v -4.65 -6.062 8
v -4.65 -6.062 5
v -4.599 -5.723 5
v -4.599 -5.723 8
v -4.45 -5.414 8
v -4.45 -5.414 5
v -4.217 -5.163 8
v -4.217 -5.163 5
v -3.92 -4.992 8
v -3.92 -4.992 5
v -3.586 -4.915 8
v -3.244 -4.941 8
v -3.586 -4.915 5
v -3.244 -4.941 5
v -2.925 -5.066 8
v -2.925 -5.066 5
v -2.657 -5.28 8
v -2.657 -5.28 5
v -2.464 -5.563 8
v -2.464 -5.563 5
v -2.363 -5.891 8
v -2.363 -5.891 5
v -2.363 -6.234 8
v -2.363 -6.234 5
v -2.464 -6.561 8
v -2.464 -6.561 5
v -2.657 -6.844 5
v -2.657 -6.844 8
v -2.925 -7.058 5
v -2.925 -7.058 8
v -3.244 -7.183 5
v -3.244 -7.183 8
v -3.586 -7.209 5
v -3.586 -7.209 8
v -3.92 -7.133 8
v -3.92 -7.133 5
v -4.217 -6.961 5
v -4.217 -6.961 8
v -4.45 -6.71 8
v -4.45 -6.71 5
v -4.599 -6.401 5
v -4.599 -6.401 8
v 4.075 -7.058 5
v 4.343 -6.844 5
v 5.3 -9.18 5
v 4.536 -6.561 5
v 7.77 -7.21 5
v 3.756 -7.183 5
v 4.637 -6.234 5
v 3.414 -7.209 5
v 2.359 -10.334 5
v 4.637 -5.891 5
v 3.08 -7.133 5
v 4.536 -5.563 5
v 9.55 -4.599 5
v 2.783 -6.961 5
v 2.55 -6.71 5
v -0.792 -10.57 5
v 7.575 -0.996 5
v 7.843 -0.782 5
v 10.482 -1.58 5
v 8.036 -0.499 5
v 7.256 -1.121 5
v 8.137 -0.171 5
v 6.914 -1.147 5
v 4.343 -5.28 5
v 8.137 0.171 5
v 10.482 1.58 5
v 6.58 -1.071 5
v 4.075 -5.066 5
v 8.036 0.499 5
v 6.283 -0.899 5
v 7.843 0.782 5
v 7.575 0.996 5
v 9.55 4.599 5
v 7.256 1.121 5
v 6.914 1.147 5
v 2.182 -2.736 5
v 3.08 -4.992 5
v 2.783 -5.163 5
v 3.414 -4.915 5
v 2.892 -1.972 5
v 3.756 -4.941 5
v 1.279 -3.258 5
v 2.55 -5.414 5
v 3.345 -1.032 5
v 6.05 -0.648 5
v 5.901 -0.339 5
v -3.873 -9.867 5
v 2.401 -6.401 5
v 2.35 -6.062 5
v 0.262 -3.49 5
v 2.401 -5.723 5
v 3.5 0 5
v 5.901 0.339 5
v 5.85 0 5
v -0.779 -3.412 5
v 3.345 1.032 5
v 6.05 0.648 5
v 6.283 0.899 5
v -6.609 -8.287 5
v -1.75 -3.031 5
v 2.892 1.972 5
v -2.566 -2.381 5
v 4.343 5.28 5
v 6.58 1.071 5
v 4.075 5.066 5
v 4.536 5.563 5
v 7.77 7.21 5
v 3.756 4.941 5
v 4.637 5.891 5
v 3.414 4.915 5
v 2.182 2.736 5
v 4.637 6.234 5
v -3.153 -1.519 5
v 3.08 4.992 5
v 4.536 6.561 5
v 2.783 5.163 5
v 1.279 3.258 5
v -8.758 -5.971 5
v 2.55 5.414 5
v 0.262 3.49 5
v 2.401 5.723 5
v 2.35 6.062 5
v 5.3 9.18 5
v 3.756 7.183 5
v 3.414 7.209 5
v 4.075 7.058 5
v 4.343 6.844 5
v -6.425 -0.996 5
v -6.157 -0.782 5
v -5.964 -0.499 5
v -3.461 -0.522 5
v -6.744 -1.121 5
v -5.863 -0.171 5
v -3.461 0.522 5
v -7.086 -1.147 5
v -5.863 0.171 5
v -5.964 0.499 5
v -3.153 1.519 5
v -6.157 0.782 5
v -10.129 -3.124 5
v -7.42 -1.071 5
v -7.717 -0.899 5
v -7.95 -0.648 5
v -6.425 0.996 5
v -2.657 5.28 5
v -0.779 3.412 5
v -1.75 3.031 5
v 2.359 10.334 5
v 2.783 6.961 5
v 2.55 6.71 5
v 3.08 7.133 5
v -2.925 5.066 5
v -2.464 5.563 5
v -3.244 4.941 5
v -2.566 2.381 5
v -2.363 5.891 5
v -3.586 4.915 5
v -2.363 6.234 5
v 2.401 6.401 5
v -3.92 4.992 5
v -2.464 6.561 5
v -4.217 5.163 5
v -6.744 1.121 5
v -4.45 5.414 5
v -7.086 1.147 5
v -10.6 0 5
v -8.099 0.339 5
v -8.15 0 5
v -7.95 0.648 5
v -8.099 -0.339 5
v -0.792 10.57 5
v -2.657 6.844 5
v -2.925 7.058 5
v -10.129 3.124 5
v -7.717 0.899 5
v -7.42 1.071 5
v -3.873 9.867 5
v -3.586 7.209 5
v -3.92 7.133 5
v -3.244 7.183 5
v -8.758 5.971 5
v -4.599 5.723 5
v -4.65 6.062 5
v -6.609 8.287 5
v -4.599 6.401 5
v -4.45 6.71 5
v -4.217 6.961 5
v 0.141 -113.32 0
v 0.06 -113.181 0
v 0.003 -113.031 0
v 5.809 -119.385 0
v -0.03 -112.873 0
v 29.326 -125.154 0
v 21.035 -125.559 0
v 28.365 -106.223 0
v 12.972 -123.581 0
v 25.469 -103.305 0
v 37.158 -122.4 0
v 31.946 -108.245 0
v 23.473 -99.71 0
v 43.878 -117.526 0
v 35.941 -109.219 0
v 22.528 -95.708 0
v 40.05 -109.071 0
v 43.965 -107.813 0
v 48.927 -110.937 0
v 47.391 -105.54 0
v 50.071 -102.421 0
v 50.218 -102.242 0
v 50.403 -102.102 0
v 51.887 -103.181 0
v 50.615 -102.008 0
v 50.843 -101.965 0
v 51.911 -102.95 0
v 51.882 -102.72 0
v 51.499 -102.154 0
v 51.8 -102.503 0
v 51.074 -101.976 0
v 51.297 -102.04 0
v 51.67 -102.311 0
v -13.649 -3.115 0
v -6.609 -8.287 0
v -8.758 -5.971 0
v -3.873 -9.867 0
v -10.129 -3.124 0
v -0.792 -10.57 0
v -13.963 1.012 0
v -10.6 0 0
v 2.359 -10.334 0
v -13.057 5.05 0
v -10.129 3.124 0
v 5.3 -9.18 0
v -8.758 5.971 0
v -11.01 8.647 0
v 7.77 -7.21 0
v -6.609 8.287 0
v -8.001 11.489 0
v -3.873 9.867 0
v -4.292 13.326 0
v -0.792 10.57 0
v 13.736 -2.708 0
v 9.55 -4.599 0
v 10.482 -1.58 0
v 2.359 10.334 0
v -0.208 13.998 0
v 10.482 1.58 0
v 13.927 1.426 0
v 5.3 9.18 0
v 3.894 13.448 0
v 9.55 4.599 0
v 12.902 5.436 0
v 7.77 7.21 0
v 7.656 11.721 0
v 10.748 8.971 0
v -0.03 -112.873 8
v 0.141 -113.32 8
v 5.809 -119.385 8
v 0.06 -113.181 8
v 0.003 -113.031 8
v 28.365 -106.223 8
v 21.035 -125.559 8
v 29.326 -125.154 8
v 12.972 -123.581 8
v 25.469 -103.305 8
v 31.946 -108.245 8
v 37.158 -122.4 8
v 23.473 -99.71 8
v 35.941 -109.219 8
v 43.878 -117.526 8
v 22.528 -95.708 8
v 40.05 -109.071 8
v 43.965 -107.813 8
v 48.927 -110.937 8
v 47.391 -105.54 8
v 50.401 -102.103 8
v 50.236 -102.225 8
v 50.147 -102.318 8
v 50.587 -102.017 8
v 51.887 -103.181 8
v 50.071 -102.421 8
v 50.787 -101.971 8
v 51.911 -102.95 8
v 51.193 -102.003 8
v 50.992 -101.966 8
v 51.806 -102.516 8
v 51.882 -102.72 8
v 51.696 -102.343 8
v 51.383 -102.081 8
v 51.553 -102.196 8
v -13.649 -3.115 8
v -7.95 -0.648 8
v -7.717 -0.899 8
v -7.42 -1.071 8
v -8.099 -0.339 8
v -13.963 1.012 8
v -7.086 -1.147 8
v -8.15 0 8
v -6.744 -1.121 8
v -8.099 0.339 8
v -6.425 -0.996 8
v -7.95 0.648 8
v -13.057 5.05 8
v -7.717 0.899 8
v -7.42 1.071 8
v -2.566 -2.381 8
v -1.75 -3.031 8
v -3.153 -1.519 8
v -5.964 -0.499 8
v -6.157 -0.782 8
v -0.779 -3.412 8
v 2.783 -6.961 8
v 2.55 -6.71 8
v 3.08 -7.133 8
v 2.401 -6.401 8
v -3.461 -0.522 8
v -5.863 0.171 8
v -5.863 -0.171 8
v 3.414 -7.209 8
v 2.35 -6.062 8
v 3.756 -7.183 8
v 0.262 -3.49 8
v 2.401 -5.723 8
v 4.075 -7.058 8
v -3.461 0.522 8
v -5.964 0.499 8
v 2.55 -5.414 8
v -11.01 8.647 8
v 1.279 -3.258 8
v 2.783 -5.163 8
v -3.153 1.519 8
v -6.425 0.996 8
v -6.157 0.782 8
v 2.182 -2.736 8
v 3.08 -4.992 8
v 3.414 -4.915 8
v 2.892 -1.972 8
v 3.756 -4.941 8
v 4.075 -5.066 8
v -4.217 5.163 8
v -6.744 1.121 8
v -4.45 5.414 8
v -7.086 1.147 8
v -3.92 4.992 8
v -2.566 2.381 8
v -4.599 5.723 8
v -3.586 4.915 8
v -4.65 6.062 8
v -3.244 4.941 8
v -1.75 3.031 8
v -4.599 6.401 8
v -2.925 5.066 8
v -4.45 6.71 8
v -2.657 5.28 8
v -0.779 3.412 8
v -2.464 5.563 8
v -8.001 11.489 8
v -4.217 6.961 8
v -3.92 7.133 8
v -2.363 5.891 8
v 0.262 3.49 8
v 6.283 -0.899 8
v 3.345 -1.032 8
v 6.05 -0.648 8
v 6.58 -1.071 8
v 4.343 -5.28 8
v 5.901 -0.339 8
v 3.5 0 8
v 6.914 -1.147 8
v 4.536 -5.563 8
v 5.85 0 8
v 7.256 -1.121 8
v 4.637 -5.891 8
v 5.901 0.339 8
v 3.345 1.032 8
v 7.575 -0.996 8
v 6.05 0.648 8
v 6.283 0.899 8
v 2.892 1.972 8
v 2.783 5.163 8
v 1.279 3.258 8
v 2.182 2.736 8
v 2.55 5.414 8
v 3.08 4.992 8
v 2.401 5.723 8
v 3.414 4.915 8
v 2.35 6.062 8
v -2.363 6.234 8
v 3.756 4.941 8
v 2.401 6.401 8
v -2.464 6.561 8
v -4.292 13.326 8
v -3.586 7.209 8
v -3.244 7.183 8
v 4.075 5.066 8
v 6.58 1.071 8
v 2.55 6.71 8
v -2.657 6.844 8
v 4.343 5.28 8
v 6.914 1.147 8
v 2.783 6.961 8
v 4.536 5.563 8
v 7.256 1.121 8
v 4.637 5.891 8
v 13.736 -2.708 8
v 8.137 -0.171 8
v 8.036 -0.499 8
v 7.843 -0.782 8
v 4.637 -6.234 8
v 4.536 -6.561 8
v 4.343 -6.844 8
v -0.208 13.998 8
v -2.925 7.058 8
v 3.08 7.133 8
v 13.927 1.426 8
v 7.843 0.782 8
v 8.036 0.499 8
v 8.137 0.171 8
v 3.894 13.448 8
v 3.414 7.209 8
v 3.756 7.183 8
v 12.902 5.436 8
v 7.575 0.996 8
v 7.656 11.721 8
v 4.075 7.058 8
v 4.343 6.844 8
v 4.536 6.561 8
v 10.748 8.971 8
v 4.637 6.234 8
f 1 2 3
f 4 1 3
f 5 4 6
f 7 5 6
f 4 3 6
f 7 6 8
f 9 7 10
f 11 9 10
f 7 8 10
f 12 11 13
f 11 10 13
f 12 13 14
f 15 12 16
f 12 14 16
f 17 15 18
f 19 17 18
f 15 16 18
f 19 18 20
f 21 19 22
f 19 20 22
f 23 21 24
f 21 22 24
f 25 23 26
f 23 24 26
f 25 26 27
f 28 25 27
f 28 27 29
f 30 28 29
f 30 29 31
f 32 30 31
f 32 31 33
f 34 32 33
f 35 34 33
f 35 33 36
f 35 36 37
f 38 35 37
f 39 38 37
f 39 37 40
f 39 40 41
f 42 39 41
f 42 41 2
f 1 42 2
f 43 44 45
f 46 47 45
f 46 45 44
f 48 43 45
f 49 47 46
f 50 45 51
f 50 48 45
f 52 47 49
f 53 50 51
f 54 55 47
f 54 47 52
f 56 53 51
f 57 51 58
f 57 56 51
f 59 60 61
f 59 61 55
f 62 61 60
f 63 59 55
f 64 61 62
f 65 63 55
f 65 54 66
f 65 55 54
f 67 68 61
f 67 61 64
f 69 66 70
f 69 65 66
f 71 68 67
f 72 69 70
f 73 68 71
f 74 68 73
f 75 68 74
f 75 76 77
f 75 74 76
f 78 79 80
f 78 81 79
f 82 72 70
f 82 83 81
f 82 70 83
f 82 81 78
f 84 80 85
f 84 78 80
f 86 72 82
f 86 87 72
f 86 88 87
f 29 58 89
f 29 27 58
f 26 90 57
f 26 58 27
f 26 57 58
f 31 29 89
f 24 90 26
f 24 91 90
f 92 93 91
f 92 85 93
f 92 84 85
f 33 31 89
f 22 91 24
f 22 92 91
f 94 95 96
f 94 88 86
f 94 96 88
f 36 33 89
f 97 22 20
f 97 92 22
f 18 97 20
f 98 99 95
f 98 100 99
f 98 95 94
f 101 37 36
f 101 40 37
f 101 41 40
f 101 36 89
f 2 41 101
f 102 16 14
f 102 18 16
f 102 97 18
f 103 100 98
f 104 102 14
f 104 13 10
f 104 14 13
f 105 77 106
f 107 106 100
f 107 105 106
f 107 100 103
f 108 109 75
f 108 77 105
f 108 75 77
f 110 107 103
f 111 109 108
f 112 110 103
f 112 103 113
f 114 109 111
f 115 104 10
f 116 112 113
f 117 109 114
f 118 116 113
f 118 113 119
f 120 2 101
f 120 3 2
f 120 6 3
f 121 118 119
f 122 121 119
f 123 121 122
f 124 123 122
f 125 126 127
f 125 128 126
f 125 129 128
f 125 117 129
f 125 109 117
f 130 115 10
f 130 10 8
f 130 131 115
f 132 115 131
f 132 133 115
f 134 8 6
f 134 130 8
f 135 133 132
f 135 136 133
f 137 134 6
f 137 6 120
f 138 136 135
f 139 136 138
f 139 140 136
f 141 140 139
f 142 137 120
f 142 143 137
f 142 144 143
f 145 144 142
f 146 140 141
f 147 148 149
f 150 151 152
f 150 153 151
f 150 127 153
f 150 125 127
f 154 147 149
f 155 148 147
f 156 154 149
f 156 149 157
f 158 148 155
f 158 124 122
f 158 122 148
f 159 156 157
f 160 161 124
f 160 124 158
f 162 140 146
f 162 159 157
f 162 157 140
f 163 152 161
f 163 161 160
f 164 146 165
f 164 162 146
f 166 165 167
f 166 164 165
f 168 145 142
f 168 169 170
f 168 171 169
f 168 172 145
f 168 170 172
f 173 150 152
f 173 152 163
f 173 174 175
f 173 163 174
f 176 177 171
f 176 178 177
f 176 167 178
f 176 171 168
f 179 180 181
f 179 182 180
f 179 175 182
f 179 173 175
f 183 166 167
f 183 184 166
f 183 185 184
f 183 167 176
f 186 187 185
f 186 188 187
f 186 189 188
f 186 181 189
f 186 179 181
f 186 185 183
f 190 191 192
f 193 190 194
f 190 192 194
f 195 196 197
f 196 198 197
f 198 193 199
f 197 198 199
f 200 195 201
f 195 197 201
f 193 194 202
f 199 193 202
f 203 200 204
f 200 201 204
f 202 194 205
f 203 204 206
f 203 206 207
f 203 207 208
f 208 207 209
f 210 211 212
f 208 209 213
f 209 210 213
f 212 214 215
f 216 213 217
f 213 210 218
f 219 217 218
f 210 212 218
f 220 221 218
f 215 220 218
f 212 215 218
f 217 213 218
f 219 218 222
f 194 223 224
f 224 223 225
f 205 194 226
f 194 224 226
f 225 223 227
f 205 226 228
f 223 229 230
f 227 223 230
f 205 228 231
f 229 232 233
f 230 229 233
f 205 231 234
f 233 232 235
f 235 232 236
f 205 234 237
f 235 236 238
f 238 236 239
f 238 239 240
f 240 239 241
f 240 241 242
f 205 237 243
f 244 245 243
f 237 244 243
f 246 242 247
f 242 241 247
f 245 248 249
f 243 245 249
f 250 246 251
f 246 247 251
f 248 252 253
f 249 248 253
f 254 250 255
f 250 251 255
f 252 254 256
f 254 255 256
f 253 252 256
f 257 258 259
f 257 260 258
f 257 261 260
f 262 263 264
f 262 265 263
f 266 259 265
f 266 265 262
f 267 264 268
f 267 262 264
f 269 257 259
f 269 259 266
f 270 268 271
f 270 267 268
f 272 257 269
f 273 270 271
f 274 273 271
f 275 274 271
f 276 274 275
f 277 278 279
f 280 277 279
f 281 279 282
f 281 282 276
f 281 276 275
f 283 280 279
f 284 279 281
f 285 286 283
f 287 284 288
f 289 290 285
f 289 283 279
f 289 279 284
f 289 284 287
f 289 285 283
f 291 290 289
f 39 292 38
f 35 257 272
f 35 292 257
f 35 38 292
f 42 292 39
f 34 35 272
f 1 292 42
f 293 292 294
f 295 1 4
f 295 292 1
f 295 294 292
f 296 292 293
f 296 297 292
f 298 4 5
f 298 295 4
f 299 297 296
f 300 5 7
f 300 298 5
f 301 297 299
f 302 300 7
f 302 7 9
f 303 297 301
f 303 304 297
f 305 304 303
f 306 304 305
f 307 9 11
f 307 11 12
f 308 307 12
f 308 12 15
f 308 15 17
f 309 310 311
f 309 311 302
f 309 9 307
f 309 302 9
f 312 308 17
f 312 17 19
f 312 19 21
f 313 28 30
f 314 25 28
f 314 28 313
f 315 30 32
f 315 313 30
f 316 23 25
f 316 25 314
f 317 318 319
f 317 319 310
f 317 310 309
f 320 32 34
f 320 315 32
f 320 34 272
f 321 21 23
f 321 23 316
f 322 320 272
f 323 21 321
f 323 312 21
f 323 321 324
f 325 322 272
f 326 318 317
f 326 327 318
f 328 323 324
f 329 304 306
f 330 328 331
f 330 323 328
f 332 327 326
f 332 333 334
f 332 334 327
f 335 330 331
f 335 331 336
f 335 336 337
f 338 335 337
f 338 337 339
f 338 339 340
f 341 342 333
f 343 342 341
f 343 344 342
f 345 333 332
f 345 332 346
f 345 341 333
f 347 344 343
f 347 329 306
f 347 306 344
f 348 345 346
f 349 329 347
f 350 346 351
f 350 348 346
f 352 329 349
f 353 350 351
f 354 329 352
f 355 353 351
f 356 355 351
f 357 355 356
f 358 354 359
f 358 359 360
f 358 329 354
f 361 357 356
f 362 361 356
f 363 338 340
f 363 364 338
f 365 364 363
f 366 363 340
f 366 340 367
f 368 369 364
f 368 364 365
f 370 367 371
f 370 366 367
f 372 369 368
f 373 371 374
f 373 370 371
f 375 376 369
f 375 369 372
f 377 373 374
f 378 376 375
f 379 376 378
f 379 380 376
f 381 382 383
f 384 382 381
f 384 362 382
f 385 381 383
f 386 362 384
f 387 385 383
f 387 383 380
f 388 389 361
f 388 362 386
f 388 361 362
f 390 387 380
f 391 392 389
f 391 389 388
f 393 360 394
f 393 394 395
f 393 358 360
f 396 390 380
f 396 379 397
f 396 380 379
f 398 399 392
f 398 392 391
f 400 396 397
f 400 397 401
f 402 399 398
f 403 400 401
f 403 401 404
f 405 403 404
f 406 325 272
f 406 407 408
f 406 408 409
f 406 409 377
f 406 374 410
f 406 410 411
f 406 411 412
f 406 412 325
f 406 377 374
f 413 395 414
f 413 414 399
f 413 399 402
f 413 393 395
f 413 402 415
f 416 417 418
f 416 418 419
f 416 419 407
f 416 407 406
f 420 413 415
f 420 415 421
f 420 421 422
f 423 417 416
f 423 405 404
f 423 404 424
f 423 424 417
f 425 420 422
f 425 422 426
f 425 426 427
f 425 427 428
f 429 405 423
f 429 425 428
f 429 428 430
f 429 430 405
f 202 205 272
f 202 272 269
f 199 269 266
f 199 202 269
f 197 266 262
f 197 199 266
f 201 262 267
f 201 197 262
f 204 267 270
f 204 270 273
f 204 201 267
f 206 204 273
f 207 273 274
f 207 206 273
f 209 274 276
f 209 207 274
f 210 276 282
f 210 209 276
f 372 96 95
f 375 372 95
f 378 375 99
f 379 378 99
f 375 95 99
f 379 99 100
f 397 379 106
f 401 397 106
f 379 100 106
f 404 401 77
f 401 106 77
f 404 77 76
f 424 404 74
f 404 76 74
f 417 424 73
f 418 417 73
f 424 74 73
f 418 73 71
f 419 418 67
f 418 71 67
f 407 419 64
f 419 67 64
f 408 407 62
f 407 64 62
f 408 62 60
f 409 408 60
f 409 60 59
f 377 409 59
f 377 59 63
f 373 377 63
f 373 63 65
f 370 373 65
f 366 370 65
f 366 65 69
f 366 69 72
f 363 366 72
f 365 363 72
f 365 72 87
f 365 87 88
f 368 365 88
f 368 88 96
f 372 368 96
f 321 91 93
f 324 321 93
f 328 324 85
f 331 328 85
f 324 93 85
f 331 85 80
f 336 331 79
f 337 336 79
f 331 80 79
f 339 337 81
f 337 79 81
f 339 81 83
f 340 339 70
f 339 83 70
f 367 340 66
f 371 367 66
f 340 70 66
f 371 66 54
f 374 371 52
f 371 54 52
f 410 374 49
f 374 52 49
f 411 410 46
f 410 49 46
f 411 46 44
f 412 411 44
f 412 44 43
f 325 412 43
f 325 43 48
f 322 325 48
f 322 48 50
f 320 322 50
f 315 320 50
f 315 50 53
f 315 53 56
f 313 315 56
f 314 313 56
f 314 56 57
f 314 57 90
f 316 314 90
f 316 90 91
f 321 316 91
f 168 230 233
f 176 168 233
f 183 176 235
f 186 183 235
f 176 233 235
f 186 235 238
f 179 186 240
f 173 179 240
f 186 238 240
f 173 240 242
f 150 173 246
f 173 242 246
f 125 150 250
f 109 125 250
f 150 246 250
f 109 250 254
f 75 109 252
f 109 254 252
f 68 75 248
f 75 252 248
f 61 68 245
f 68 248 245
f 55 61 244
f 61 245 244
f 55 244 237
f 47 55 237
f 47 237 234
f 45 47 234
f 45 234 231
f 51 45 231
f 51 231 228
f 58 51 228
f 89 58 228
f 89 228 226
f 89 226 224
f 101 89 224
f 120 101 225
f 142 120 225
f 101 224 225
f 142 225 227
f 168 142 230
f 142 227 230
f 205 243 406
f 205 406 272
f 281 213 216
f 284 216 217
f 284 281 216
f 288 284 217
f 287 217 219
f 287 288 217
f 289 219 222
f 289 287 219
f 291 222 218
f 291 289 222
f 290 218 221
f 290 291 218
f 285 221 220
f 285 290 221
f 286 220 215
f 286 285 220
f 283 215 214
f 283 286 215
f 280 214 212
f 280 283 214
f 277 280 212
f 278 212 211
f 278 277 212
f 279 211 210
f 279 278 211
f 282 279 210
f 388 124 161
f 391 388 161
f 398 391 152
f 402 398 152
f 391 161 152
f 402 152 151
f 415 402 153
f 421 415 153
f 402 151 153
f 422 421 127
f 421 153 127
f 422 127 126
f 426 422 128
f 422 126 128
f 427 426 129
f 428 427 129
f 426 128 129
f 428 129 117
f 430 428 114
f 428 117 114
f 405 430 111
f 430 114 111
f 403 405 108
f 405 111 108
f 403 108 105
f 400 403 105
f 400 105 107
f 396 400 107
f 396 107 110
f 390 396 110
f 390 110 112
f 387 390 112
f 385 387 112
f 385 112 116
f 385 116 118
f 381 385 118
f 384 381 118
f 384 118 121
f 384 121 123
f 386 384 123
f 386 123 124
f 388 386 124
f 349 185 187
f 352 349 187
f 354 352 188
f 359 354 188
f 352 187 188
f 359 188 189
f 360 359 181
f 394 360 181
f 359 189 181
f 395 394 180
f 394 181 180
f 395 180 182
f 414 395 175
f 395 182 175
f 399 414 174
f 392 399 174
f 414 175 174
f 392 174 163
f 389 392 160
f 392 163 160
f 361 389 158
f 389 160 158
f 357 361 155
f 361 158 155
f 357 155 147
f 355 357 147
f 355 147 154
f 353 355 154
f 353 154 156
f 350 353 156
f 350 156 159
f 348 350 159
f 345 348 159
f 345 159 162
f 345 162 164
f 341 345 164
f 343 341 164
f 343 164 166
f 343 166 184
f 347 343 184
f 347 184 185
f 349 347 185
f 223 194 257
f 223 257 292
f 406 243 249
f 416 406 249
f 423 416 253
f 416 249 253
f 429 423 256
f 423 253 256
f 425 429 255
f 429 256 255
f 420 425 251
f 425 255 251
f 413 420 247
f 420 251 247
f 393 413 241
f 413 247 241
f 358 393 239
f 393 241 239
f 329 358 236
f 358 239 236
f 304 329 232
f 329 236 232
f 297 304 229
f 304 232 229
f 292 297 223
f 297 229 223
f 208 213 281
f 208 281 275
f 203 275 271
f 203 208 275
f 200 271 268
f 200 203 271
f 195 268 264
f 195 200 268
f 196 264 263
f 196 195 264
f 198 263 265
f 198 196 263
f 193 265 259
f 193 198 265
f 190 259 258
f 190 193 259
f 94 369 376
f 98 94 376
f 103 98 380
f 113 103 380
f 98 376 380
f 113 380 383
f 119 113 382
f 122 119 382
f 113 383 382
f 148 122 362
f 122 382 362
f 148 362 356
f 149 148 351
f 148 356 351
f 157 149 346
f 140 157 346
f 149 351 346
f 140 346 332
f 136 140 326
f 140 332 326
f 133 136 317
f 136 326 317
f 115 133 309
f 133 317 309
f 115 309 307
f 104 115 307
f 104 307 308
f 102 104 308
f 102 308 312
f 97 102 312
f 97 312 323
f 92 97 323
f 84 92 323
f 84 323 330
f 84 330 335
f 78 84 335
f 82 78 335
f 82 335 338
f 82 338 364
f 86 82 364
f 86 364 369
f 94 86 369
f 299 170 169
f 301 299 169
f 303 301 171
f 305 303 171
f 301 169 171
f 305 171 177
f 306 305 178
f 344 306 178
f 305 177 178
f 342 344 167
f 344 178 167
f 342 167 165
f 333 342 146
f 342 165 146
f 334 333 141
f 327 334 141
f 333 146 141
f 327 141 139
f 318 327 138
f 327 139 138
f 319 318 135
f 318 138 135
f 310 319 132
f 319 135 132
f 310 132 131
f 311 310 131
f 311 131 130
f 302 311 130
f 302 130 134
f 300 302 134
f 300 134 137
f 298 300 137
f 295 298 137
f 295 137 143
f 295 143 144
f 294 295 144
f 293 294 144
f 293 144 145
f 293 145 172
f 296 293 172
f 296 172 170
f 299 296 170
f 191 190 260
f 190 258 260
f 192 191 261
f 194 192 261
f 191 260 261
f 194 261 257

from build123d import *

# Parameters (mm, degrees)
SKETCH_1_R          = 14
EXTRUDE_1_DEPTH     = 8
SKETCH_3_R          = 3.5
CUT_EXTRUDE_2_DEPTH = 10
EXTRUDE_START       = -8
EXTRUDE_3_DEPTH     = 8
SKETCH_2_R          = 10.6
CUT_EXTRUDE_3_DEPTH = 5
SKETCH_7_R          = 1.15
CUT_EXTRUDE_4_DEPTH = 5
FILLET_1_R          = 1
FILLET_2_R          = 1


with BuildPart() as part:
    # 스케치1 → 보스-돌출1 (new body)
    with BuildSketch(Plane.XY):
        Circle(SKETCH_1_R)
    extrude(amount=EXTRUDE_1_DEPTH)

    # 스케치3 → 컷-돌출2 (cut)
    with BuildSketch(Plane.XY.offset(8)):
        Circle(SKETCH_3_R)
    extrude(amount=-CUT_EXTRUDE_2_DEPTH, mode=Mode.SUBTRACT)

    # 스케치6 → 보스-돌출3 (add)
    with BuildSketch(Plane.XY.offset(8).offset(EXTRUDE_START)):
        with BuildLine():
            Line((13.735578357, -2.708115061), (22.528484651, -95.708115061))
            ThreePointArc((22.528484651, -95.708115061), (38.172657843, -109.27935171), (52.461884597, -94.288133687))
            ThreePointArc((52.461884597, -94.288133687), (33.515079478, -123.998980013), (0, -113.115264599))
            Line((0, -113.115264599), (-13.64899727, -3.115264599))
            ThreePointArc((-13.64899727, -3.115264599), (0.208126783, -13.998452887), (13.735578357, -2.708115061))
        make_face()
    extrude(amount=EXTRUDE_3_DEPTH)

    # 스케치2 → 컷-돌출3 (cut)
    with BuildSketch(Plane(origin=(0, 0, 0), x_dir=(-1, 0, 0), z_dir=(0, 0, -1))):
        Circle(SKETCH_2_R)
    extrude(amount=-CUT_EXTRUDE_3_DEPTH, mode=Mode.SUBTRACT)

    # 스케치7 → 컷-돌출4 (cut)
    with BuildSketch(Plane(origin=(0, 0, 5), x_dir=(-1, 0, 0), z_dir=(0, 0, -1))):
        with Locations((7, 0)):
            Circle(SKETCH_7_R)
        with Locations((3.5, -6.062177826)):
            Circle(SKETCH_7_R)
        with Locations((-3.5, -6.062177826)):
            Circle(SKETCH_7_R)
        with Locations((-7, 0)):
            Circle(SKETCH_7_R)
        with Locations((-3.5, 6.062177826)):
            Circle(SKETCH_7_R)
        with Locations((3.5, 6.062177826)):
            Circle(SKETCH_7_R)
    extrude(amount=-CUT_EXTRUDE_4_DEPTH, mode=Mode.SUBTRACT)

    # 필렛1
    fillet_1_edges = [part.edges().sort_by_distance(p)[0] for p in [
        (52.461884597, -94.288133687, 4),
    ]]
    fillet(fillet_1_edges, radius=FILLET_1_R)

    # 필렛2
    fillet_2_edges = [part.edges().sort_by_distance(p)[0] for p in [
        (0, -113.115264599, 4),
    ]]
    fillet(fillet_2_edges, radius=FILLET_2_R)


solid = part.part
